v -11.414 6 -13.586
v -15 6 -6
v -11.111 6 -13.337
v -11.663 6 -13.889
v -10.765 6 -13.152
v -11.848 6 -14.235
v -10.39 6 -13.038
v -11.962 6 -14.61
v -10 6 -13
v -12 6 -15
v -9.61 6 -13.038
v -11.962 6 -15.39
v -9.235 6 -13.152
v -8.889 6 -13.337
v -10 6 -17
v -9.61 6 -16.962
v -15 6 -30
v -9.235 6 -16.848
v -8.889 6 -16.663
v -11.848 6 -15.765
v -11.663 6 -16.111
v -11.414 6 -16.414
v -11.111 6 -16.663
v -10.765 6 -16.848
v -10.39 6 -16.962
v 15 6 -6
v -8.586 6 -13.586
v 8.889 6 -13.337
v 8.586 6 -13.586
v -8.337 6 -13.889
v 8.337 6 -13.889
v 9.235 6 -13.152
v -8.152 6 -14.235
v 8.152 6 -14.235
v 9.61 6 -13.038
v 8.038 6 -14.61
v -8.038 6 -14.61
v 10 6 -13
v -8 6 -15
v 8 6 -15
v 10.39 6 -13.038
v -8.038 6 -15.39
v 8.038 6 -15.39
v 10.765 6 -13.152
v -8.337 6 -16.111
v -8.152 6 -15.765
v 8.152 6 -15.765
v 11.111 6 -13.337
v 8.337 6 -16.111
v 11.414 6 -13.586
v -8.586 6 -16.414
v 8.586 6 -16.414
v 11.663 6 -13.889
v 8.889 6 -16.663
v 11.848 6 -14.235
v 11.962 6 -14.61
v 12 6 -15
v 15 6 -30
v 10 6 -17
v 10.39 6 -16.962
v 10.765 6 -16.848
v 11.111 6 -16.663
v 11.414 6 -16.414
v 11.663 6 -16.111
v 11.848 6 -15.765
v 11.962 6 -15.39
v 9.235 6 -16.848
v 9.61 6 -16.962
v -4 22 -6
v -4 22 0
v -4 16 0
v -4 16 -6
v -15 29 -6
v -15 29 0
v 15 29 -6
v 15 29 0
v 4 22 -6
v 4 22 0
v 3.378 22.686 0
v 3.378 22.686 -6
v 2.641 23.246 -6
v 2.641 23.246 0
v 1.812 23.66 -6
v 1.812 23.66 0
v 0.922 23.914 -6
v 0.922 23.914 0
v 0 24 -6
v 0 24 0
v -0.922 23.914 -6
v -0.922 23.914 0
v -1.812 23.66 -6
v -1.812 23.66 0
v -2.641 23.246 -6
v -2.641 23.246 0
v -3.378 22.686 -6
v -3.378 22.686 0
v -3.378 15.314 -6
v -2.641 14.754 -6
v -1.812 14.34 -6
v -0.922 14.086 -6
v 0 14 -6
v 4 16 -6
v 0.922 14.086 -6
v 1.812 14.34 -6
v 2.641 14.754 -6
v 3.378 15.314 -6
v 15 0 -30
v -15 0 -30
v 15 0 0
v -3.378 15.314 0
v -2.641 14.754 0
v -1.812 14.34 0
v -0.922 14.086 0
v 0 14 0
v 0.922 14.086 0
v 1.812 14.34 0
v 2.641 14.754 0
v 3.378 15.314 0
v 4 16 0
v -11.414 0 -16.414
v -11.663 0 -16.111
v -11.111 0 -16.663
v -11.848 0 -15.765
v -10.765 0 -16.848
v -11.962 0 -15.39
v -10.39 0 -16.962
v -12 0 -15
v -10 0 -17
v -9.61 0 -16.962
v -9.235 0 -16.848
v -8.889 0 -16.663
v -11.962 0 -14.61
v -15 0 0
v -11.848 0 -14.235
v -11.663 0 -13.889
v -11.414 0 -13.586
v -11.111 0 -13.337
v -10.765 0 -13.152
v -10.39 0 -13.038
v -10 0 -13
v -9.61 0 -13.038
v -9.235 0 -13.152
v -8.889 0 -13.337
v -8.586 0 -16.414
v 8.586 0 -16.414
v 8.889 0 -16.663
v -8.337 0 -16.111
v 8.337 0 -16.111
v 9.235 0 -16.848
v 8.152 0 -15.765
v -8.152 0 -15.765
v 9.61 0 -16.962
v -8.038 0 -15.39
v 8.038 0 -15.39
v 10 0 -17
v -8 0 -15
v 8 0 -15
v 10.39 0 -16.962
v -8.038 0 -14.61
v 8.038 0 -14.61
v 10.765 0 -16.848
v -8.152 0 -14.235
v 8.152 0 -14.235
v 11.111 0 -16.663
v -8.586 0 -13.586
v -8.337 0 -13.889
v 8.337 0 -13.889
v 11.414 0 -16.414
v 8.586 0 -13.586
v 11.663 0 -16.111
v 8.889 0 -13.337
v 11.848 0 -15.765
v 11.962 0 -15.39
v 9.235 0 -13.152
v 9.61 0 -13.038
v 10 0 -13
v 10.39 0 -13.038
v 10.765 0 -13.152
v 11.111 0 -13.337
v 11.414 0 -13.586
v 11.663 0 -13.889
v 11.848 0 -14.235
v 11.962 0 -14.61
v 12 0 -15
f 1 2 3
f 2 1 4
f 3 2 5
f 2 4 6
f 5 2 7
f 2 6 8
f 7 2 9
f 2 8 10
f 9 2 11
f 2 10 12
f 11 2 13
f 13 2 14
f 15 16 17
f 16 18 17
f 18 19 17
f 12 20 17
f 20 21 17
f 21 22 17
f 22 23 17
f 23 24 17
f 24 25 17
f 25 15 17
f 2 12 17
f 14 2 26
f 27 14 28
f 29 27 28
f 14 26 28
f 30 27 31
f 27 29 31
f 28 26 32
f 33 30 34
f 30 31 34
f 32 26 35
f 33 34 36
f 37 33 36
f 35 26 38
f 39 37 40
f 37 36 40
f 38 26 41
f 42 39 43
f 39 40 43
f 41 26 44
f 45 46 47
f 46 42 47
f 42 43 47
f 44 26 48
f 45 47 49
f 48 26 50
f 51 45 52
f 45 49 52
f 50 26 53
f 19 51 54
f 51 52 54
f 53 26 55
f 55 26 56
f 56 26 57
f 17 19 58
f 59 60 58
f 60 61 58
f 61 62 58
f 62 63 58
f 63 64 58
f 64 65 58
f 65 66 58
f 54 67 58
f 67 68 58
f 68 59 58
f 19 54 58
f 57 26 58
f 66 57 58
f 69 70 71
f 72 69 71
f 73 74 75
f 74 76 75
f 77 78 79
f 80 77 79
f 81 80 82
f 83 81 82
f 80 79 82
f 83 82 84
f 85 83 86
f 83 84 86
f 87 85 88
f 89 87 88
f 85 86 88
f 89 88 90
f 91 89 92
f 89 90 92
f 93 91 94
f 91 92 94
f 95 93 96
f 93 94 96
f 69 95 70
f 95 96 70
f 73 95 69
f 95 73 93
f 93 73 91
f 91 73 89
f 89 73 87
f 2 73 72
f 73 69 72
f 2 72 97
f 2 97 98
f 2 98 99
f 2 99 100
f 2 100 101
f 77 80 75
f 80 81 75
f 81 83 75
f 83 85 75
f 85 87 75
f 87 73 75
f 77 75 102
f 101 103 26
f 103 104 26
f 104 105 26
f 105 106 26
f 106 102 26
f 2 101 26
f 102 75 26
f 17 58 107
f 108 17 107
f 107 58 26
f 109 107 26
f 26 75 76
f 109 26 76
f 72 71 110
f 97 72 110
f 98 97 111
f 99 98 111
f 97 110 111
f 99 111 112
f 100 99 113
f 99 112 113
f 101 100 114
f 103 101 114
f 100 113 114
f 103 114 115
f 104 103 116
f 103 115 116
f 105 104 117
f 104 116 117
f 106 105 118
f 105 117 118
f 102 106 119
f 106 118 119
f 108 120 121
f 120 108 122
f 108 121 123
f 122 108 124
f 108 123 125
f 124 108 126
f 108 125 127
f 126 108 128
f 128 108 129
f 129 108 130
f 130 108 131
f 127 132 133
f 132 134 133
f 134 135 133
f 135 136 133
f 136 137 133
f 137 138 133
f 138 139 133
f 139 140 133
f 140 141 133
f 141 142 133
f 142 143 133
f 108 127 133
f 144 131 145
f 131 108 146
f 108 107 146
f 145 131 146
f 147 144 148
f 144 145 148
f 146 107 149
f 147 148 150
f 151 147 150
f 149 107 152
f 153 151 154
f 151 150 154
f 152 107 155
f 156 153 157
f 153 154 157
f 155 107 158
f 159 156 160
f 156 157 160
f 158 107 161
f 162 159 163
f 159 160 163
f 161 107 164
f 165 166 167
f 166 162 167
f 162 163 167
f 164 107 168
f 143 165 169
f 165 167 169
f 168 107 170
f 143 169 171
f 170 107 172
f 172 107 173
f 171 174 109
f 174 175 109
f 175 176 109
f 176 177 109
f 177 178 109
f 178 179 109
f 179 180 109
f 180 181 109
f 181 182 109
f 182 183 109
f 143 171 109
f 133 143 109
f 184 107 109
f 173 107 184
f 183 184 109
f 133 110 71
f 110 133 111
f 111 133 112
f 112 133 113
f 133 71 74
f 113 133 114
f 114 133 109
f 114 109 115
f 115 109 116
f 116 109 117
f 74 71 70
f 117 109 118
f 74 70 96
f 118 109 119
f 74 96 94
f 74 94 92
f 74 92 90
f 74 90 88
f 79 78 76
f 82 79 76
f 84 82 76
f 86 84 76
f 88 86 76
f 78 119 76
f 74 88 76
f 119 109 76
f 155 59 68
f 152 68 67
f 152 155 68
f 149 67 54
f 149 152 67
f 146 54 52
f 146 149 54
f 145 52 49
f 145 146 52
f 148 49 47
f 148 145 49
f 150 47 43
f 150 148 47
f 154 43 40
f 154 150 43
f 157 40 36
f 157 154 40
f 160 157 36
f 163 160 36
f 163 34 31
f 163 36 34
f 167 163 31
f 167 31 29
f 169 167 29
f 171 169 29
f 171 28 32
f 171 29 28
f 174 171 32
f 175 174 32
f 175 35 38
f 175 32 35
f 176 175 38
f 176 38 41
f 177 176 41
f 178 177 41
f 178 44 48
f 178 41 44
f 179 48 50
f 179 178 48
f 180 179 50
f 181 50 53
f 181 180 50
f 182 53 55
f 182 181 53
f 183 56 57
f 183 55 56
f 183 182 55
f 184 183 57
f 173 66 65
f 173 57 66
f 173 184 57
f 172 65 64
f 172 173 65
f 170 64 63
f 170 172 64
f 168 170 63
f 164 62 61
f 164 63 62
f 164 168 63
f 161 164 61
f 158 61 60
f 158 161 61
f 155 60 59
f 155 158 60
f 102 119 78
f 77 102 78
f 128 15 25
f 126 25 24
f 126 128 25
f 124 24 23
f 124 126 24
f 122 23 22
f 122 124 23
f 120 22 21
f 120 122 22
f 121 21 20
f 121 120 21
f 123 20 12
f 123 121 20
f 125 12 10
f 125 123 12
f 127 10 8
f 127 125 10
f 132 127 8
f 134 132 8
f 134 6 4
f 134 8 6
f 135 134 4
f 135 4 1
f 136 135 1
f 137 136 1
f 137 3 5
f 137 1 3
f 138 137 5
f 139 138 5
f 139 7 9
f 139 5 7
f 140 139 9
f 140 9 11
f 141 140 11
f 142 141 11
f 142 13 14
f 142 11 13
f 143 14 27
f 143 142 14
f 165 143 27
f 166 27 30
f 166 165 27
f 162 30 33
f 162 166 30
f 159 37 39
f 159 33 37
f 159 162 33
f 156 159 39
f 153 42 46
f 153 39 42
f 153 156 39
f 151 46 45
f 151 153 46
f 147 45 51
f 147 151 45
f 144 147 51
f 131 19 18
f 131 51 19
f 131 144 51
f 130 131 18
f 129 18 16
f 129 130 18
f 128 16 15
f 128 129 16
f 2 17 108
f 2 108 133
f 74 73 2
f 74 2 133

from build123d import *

# Parameters (mm, degrees)
EXTRUDE_1_DEPTH     = 15
SKETCH_2_R          = 2
CUT_EXTRUDE_1_DEPTH = 40
CUT_EXTRUDE_2_DEPTH = 40


with BuildPart() as part:
    # 草图1 → 凸台-拉伸1 (new, symmetric)
    with BuildSketch(Plane(origin=(0, 0, 0), x_dir=(0, 0, -1), z_dir=(1, 0, 0))):
        Polygon((0, 0), (0, 29), (6, 29), (6, 6), (30, 6), (30, 0), align=None)
    extrude(amount=EXTRUDE_1_DEPTH, both=True)

    # 草图2 → 切除-拉伸1 (cut)
    with BuildSketch(Plane(origin=(0, 0, 0), x_dir=(1, 0, 0), z_dir=(0, 1, 0))):
        with Locations(Location((-10, 15, 0), (0, 0, 90))):
            Circle(SKETCH_2_R)
        with Locations(Location((10, 15, 0), (0, 0, 90))):
            Circle(SKETCH_2_R)
    extrude(amount=CUT_EXTRUDE_1_DEPTH, mode=Mode.SUBTRACT)

    # 草图3 → 切除-拉伸2 (cut)
    with BuildSketch(Plane.XY):
        with BuildLine():
            Line((-4, 22), (-4, 16))
            ThreePointArc((-4, 16), (0, 14), (4, 16))
            Line((4, 16), (4, 22))
            ThreePointArc((4, 22), (0, 24), (-4, 22))
        make_face()
    extrude(amount=-CUT_EXTRUDE_2_DEPTH, mode=Mode.SUBTRACT)


solid = part.part
